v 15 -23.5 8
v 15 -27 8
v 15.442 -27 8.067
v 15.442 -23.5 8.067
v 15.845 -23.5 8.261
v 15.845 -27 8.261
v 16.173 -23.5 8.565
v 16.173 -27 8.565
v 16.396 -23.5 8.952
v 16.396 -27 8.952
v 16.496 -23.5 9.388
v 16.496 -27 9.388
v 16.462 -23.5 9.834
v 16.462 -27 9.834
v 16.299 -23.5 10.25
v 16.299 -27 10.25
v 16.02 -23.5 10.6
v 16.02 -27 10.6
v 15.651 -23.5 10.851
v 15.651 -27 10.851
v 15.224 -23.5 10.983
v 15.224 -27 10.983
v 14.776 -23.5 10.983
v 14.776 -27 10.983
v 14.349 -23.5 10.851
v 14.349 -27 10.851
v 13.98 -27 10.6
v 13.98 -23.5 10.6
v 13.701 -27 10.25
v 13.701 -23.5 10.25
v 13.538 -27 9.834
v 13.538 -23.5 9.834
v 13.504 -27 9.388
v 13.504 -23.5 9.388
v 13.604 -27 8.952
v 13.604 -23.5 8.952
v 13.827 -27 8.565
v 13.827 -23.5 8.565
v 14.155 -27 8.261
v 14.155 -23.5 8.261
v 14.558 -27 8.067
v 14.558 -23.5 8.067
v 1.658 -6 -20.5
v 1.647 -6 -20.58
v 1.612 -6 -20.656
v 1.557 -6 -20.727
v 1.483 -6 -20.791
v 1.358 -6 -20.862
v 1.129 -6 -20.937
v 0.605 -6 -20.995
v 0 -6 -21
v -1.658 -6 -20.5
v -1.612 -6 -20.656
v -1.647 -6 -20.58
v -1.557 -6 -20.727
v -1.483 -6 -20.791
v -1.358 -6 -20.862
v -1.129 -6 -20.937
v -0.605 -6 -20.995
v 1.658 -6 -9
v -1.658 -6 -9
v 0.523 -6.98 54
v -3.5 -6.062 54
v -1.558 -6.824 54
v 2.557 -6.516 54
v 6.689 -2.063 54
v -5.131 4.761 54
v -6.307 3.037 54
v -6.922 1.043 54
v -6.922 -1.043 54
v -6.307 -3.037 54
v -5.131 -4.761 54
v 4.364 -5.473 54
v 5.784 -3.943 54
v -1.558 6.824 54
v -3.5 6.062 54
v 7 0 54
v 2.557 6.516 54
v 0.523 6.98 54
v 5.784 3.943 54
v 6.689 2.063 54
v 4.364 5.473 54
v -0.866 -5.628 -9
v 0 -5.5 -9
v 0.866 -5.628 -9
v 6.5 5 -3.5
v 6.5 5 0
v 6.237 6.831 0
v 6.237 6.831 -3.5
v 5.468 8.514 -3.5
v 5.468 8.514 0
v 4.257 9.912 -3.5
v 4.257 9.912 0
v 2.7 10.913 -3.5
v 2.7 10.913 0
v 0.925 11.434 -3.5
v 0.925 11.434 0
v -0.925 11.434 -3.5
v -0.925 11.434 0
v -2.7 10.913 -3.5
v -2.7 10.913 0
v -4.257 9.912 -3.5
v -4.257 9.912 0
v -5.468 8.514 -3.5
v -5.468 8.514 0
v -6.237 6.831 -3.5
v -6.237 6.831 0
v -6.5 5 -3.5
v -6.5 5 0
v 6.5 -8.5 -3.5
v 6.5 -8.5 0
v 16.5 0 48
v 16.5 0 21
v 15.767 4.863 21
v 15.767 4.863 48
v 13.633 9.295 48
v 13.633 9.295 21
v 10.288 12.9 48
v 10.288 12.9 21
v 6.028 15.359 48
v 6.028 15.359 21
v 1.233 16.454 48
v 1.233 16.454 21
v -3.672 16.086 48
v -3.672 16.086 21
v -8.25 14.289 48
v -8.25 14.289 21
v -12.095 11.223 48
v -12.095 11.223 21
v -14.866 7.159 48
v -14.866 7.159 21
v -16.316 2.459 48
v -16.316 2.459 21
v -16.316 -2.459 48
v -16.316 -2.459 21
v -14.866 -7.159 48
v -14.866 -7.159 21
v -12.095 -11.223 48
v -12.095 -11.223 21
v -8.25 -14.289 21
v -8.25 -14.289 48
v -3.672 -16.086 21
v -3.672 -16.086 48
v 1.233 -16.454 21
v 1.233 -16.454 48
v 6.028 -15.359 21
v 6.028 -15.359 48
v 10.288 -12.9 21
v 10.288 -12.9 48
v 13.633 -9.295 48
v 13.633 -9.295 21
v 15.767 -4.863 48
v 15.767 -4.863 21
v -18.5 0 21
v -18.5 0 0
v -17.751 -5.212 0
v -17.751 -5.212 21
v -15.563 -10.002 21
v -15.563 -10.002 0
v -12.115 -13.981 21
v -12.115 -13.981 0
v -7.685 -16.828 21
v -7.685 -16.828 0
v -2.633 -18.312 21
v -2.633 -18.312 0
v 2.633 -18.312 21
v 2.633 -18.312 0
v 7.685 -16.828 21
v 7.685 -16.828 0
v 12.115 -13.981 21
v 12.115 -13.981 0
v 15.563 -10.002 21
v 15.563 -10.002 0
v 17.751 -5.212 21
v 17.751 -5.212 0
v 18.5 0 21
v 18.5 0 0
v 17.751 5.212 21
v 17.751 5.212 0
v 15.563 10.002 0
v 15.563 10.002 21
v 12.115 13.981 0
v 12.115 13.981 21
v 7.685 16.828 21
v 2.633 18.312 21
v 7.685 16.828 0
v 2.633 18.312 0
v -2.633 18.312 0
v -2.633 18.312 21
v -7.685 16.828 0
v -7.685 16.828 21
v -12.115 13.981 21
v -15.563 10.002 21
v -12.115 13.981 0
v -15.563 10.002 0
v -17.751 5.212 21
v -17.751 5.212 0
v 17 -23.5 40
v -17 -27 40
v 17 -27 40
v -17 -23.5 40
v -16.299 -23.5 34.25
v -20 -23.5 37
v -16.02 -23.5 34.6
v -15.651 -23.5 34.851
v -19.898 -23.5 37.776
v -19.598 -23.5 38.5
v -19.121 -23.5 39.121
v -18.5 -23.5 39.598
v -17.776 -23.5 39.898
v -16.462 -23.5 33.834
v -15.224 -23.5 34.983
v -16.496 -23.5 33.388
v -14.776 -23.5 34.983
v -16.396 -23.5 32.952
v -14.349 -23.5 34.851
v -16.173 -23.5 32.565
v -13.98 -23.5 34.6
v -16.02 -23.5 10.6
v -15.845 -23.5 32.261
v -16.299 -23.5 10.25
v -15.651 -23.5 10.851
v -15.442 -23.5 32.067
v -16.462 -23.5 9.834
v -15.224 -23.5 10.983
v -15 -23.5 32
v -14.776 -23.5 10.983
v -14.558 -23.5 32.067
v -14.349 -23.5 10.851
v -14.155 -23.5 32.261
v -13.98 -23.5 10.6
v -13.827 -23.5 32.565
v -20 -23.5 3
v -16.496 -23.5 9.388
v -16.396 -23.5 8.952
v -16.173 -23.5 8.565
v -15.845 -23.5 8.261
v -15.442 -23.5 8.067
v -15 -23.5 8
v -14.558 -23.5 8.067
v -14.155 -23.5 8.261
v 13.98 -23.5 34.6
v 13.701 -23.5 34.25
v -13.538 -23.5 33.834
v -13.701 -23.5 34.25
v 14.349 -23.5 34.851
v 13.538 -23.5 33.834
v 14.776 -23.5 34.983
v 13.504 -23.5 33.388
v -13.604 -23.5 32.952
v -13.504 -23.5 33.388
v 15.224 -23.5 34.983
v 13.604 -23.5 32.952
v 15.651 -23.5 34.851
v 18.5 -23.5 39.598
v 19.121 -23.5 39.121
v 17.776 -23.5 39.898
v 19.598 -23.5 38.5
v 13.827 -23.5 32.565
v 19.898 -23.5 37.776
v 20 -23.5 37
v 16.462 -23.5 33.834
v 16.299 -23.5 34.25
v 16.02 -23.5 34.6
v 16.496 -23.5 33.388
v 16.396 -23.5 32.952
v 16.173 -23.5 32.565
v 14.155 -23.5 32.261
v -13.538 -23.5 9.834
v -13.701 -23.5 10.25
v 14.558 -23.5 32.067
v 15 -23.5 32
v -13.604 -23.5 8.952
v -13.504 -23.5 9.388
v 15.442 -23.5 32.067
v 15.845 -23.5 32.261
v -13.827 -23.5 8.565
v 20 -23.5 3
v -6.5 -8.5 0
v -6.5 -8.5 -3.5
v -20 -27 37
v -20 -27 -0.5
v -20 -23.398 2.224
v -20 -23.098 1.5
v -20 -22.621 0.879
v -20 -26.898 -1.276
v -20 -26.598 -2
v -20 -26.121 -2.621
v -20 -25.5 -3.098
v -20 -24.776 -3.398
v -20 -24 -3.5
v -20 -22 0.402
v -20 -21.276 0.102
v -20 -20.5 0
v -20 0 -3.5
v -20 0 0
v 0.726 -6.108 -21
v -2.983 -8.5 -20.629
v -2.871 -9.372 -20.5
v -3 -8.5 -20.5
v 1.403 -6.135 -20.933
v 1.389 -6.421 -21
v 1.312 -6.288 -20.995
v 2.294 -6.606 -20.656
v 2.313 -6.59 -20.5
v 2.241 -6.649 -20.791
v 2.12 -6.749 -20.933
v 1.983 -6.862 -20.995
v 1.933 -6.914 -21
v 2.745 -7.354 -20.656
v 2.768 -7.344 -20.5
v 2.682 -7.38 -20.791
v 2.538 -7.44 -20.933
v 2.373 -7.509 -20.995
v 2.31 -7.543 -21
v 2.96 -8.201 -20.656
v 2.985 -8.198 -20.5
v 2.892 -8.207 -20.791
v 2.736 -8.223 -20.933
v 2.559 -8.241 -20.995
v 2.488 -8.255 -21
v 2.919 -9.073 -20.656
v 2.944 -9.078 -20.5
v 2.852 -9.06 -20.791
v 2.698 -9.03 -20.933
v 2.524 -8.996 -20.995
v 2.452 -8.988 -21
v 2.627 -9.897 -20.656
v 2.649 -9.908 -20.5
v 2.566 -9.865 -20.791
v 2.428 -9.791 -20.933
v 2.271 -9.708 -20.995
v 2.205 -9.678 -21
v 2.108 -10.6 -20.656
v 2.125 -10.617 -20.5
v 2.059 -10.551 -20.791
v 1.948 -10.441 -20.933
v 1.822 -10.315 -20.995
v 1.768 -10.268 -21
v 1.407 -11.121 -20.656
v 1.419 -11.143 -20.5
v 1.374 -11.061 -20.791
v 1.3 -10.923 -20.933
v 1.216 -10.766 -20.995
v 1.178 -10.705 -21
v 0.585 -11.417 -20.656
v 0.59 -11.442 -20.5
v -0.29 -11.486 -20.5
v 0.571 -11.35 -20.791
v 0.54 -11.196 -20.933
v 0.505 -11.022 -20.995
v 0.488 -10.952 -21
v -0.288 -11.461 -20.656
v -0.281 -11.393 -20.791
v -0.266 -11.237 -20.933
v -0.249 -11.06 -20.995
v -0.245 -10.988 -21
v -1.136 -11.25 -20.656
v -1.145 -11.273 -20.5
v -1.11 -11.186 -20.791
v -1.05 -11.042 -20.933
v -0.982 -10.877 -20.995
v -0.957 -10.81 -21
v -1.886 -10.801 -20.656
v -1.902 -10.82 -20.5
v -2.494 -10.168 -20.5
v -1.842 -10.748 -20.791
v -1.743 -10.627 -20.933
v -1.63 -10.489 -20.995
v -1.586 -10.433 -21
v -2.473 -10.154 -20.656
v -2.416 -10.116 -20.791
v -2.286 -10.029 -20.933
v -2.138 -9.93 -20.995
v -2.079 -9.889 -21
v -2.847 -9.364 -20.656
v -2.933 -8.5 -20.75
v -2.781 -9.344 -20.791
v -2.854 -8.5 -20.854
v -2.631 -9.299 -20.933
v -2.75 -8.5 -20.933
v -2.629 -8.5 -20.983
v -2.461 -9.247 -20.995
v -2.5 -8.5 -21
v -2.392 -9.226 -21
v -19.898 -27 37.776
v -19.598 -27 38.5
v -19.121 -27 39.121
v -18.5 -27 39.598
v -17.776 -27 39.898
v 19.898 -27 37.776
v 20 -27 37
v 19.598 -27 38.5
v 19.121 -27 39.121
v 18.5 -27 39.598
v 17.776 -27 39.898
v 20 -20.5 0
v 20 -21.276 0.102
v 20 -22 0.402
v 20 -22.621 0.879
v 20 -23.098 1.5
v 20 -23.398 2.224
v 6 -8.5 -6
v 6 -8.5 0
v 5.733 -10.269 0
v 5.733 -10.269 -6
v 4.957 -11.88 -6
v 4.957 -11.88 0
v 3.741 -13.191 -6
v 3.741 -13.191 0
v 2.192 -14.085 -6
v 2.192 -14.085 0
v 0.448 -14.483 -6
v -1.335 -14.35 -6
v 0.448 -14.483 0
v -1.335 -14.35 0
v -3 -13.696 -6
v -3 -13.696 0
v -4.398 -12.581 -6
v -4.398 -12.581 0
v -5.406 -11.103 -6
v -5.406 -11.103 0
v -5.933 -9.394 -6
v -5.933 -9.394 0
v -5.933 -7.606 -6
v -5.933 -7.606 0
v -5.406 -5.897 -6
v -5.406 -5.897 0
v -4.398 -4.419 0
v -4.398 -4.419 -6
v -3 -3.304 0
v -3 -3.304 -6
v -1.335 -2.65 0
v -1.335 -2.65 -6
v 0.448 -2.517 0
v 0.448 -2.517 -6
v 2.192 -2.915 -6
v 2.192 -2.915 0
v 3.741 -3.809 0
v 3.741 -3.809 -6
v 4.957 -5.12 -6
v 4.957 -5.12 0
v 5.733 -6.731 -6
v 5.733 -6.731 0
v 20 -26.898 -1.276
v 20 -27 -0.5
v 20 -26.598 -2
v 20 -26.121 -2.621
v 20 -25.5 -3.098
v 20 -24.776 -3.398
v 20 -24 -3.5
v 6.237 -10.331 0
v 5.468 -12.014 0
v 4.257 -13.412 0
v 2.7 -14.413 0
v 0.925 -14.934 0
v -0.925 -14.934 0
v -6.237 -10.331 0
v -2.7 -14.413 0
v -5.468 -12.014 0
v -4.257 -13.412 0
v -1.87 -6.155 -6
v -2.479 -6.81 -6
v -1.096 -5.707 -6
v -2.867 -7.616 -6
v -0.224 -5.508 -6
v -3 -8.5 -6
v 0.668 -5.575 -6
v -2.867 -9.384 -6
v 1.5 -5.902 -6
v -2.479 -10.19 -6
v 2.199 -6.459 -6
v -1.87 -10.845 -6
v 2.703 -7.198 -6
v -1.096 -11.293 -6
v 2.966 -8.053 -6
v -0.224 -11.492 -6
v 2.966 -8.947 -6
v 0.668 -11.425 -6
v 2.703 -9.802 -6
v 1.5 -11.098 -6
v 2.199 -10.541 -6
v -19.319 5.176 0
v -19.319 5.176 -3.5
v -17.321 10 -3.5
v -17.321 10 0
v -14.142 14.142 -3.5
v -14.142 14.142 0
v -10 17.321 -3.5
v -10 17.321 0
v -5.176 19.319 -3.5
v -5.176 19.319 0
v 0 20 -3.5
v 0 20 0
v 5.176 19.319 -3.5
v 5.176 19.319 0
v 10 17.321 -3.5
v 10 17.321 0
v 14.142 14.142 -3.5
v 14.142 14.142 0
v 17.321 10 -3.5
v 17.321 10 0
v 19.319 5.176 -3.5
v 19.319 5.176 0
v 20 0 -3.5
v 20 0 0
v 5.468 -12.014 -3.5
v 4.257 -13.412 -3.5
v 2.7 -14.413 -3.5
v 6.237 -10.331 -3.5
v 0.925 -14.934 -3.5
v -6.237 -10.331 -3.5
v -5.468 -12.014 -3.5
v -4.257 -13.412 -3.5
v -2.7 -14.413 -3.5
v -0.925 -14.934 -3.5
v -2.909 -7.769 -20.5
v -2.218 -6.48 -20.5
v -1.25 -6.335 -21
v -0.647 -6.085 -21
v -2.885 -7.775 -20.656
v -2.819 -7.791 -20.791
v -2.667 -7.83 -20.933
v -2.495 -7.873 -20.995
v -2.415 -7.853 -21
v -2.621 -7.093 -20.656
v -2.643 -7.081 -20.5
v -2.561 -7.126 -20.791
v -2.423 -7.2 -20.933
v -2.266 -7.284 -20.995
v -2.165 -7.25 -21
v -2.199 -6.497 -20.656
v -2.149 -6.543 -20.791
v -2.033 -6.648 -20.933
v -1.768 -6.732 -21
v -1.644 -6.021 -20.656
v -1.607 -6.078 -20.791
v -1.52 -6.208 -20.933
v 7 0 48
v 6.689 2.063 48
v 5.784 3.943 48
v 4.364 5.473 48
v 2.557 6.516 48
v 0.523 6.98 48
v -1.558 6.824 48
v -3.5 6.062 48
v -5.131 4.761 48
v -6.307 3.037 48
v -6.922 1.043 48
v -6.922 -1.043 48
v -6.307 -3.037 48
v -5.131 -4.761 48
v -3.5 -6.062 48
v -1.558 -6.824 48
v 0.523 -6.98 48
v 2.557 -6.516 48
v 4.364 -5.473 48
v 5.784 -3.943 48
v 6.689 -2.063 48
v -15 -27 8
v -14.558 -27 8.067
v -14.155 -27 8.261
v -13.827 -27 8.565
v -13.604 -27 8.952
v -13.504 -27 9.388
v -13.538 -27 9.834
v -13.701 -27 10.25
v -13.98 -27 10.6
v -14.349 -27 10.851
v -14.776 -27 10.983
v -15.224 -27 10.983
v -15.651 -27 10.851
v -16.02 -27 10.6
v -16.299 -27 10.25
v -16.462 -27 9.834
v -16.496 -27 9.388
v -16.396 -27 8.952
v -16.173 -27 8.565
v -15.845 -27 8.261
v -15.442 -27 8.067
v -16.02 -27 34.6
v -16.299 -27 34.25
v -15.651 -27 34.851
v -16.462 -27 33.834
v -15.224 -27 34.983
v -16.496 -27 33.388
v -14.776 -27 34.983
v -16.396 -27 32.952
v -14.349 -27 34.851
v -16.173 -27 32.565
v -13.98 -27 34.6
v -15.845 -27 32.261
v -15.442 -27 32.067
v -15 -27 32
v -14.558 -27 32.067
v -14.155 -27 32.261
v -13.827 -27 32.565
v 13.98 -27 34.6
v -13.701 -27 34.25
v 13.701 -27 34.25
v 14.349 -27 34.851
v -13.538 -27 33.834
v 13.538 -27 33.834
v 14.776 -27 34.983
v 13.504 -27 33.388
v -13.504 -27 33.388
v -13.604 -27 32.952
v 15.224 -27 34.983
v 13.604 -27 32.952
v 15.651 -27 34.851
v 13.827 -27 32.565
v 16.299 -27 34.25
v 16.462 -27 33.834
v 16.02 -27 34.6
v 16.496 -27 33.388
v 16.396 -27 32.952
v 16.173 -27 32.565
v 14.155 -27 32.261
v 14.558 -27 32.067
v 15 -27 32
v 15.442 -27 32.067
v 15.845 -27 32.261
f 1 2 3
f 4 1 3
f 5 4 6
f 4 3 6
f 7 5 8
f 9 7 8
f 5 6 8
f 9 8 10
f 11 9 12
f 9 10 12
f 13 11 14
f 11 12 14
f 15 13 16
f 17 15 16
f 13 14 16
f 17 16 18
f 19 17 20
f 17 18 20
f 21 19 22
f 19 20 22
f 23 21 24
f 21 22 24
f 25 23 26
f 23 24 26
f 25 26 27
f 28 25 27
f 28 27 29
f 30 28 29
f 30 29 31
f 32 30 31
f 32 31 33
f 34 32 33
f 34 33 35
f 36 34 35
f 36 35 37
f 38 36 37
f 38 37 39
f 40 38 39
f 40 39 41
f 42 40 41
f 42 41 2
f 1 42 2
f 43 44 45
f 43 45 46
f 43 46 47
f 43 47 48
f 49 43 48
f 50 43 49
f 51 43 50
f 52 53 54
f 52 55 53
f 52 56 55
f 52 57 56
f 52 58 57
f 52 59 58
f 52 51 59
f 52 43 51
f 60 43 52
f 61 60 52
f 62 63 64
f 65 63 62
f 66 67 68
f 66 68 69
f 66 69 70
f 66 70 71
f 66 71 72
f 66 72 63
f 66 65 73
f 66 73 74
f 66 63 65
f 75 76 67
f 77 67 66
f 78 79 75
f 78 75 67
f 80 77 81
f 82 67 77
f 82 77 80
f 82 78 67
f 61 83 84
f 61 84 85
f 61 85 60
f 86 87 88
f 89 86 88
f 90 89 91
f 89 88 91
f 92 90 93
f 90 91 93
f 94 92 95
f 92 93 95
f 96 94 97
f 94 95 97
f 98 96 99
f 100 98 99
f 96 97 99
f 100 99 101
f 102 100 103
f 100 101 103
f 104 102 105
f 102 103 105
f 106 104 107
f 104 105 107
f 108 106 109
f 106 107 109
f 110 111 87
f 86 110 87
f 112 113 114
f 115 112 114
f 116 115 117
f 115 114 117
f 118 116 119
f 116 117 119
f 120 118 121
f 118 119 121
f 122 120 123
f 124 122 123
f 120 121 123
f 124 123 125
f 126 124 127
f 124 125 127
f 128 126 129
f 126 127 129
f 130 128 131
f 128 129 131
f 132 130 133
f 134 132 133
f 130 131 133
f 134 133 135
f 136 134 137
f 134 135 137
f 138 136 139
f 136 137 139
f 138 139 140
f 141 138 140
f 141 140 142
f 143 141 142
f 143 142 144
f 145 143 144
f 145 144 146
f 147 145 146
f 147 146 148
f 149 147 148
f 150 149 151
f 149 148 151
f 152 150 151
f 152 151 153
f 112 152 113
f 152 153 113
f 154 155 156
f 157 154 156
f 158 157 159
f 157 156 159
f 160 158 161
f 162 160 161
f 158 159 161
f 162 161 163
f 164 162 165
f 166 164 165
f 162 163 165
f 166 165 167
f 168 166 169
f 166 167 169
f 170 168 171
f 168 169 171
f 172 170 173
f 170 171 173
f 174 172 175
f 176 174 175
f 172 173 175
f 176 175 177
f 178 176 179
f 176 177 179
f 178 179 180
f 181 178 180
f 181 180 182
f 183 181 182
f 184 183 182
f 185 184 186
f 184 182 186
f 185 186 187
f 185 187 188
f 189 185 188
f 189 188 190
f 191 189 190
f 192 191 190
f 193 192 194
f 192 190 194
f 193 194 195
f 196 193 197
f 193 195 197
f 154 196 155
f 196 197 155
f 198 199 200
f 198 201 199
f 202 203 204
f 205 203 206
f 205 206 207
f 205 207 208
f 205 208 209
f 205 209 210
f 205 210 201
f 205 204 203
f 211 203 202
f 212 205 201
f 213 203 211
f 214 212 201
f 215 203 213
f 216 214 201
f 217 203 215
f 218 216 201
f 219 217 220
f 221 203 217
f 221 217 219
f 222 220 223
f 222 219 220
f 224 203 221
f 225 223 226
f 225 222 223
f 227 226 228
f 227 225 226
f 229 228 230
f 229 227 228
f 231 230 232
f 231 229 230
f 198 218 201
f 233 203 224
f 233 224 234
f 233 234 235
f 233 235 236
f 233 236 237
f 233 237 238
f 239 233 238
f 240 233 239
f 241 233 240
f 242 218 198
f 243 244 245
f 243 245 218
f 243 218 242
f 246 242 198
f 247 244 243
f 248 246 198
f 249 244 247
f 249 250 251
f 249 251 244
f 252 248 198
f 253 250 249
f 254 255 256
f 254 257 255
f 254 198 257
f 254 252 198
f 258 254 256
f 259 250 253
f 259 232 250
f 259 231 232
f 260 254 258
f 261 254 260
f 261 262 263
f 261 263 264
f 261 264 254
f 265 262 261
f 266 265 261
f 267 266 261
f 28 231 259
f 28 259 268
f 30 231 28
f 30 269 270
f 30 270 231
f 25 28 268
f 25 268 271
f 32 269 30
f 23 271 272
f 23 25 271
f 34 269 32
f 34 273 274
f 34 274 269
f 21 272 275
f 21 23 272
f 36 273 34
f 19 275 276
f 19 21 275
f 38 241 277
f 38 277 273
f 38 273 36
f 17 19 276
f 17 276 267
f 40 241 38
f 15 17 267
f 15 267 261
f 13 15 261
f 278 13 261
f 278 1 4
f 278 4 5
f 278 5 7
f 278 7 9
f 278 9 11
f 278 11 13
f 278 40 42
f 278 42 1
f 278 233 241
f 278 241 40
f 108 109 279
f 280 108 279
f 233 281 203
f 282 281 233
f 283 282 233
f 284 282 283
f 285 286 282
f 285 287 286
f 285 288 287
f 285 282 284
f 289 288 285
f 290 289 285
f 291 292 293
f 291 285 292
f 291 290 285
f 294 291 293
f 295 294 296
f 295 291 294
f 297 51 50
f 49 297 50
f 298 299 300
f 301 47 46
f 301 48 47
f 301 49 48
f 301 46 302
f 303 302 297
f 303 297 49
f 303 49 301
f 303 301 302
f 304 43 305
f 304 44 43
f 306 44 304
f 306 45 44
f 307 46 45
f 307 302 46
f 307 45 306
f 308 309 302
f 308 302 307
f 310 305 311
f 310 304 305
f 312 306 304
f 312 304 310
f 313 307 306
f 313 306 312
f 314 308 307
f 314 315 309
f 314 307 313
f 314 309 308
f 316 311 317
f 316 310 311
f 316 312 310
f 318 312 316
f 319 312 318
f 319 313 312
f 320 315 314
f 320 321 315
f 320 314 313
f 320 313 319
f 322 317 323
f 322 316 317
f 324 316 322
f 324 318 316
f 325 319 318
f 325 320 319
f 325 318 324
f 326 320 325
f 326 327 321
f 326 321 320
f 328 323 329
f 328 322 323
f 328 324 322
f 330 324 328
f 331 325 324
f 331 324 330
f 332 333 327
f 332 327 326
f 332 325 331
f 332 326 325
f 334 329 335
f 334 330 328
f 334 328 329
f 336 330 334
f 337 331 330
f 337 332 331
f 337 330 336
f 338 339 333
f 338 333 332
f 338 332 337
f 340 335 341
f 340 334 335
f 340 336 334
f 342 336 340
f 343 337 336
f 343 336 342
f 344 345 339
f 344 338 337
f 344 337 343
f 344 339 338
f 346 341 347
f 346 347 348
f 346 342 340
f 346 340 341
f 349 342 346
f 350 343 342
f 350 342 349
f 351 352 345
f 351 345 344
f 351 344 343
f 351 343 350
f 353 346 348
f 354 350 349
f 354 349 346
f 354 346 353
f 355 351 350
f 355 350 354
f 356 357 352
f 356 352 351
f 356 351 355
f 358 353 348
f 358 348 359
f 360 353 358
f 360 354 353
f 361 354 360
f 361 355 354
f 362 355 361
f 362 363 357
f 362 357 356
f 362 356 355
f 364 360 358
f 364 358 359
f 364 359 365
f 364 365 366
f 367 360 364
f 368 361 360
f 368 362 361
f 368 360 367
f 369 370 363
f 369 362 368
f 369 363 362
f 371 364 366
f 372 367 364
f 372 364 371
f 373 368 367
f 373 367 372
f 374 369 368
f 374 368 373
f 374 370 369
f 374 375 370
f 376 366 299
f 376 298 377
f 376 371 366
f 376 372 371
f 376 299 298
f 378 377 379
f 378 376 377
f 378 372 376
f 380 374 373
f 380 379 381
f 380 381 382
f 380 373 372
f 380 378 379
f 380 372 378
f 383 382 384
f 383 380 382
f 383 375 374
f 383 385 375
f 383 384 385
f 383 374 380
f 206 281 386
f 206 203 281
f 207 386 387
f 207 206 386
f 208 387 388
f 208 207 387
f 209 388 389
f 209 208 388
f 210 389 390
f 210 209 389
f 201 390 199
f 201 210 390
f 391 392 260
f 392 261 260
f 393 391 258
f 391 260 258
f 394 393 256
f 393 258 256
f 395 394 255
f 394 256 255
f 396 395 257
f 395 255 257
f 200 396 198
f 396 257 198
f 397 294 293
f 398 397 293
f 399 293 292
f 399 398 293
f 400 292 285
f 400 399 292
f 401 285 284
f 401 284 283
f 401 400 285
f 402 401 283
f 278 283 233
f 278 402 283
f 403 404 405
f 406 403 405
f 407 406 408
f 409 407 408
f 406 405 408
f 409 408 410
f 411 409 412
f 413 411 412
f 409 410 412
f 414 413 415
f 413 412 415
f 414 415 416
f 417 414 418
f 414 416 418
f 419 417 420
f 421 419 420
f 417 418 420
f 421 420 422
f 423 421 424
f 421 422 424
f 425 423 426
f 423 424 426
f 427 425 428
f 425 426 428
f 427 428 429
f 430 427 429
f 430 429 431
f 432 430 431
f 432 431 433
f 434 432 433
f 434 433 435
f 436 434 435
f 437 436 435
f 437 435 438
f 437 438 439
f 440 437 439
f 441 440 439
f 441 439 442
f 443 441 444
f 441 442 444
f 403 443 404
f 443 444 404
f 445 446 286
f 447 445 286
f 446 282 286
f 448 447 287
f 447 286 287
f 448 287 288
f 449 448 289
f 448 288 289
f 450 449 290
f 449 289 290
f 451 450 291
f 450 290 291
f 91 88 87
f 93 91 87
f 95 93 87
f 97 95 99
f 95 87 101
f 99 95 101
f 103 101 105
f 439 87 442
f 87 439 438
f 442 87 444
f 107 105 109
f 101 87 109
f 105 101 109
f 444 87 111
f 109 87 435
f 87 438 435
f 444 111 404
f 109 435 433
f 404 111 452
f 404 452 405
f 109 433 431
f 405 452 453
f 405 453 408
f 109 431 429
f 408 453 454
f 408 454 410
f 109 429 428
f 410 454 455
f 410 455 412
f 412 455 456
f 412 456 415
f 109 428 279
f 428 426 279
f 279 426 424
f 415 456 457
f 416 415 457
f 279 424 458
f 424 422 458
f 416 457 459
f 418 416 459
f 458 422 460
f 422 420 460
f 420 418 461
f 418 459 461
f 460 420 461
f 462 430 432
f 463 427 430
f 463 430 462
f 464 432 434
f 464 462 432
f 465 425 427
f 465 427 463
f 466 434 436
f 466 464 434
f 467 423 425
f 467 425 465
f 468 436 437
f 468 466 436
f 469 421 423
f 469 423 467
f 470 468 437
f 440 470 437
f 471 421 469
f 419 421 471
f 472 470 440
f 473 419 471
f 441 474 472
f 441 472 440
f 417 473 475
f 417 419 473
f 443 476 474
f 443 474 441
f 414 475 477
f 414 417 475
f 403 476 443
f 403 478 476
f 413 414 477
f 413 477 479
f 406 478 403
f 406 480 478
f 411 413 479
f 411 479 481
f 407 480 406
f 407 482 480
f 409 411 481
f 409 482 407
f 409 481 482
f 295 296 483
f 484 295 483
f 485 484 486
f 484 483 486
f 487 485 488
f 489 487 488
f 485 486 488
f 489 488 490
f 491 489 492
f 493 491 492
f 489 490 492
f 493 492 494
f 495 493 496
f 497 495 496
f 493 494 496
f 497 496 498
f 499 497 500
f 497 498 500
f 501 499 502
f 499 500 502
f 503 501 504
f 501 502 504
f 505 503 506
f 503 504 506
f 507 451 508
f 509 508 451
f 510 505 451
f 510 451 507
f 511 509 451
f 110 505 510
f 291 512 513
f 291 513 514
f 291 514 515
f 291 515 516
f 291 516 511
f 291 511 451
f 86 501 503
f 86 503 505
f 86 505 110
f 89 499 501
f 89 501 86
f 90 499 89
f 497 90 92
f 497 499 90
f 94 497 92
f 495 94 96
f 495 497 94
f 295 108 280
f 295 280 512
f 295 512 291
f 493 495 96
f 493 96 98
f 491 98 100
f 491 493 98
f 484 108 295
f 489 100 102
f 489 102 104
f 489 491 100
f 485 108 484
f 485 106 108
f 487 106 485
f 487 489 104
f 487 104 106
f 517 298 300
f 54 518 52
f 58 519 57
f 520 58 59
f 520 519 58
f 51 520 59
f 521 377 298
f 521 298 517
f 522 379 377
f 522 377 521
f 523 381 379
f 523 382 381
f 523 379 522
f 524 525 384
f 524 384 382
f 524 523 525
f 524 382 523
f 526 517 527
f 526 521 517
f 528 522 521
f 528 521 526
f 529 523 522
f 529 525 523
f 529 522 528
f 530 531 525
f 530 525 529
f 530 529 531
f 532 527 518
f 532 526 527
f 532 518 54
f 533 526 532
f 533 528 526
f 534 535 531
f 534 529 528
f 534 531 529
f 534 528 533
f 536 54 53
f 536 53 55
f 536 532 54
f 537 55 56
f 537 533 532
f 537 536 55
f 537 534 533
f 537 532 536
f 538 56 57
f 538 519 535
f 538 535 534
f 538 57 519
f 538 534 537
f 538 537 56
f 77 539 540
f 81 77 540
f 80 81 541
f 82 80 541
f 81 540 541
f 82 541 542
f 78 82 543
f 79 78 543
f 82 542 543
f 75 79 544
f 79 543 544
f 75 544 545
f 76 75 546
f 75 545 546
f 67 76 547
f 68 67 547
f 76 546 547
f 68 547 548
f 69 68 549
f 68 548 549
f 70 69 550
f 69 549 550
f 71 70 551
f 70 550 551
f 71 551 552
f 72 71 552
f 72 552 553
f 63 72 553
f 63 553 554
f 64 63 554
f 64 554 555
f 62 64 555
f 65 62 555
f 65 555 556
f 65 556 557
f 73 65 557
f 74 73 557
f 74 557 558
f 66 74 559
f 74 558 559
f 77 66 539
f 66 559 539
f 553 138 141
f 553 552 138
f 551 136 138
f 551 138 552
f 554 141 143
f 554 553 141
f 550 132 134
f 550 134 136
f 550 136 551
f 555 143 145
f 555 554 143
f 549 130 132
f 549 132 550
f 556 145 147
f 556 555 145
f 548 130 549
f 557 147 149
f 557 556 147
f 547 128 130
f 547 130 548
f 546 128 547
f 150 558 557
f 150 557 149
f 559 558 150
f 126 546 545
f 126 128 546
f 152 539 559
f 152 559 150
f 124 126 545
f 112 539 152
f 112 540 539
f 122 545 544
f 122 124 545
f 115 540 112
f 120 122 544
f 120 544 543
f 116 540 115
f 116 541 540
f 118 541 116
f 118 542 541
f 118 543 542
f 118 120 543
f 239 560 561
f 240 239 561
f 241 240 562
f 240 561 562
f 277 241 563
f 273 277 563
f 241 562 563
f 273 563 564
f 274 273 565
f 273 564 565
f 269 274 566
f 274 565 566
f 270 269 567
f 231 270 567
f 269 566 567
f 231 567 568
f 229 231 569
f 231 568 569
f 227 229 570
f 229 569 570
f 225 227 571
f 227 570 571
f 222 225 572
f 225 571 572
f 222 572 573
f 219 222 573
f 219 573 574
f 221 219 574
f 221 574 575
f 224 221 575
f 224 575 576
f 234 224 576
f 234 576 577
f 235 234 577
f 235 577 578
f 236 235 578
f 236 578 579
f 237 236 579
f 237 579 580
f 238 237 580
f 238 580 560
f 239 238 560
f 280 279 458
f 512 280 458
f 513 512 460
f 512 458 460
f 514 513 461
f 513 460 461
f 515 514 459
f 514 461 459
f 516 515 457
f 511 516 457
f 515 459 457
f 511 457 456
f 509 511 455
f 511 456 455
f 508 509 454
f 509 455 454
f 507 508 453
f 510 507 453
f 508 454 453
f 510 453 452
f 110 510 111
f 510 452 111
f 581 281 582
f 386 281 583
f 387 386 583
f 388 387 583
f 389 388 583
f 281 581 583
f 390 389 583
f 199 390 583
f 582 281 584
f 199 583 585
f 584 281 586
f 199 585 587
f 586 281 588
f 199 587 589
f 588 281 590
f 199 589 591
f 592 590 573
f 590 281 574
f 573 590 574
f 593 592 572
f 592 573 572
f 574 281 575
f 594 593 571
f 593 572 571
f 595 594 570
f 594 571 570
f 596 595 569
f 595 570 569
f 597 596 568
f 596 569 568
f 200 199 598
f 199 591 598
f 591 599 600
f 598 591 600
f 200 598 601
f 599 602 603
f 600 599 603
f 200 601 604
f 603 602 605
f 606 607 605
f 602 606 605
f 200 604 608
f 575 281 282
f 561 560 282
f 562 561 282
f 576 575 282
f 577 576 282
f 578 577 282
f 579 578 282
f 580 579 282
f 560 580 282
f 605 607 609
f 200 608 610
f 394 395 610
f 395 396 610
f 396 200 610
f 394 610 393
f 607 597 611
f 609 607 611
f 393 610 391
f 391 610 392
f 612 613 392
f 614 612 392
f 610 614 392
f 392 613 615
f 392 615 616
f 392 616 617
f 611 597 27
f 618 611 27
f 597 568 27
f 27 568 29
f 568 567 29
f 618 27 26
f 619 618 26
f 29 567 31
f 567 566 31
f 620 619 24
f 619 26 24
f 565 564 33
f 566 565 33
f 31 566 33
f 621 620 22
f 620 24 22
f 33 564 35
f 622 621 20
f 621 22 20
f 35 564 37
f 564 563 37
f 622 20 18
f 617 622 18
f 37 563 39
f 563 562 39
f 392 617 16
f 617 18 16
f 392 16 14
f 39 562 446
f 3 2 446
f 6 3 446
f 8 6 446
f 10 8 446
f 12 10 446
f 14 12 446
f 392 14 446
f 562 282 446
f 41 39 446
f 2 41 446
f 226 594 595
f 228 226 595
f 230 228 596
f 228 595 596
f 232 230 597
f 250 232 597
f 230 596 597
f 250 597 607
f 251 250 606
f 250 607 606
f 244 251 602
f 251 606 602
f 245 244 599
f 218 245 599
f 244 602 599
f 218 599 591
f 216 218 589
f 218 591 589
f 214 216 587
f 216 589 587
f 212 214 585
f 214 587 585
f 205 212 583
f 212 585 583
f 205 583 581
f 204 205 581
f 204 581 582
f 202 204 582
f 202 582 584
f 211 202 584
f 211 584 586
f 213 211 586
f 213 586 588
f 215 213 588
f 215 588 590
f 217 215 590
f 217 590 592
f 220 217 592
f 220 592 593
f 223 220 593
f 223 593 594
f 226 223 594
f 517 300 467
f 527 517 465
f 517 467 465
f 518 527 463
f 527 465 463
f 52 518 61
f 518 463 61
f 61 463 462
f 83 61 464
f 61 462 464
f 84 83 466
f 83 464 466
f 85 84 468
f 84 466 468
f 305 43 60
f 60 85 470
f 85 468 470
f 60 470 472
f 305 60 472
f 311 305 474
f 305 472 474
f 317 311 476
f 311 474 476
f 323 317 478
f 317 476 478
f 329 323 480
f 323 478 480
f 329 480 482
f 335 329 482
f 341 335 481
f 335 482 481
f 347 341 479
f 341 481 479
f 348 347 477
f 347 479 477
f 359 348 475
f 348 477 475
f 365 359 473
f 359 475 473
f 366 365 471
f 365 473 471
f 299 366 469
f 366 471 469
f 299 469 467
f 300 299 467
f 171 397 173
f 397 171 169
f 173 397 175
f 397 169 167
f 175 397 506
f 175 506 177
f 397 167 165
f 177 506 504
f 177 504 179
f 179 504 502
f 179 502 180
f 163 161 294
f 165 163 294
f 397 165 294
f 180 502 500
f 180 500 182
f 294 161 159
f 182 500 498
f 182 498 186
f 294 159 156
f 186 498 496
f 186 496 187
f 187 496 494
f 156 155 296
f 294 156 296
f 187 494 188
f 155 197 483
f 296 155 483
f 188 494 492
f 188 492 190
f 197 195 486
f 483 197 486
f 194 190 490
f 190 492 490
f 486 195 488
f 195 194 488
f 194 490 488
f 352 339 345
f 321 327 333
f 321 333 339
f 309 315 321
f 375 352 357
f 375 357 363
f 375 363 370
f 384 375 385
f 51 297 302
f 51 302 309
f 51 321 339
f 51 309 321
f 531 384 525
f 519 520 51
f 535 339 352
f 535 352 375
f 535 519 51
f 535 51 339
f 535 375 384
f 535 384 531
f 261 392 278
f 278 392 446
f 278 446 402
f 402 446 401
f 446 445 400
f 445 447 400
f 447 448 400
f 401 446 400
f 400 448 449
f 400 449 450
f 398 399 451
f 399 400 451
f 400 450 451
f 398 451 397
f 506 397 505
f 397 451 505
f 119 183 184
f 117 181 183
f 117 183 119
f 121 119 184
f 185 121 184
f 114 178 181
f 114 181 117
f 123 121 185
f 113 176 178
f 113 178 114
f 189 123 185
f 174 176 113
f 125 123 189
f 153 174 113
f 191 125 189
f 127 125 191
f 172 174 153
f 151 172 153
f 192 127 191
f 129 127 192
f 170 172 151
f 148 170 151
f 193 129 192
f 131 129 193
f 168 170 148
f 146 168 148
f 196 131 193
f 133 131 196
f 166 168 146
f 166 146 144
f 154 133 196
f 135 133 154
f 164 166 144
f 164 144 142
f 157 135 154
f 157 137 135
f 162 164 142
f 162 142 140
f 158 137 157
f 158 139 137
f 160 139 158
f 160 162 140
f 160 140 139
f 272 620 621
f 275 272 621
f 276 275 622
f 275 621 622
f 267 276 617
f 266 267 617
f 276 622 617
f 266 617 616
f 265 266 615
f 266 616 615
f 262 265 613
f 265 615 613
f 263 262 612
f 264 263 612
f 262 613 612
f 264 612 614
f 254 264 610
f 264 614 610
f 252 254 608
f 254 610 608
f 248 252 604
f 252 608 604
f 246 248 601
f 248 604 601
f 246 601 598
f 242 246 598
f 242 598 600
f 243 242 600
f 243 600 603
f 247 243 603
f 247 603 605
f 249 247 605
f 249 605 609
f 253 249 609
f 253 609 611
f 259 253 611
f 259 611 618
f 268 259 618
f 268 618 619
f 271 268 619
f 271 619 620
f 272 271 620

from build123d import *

# Parameters (mm, degrees)
SKETCH1_R           = 18.5
BOSS_EXTRUDE1_DEPTH = 21
SKETCH2_R           = 16.5
BOSS_EXTRUDE2_DEPTH = 27
SKETCH3_R           = 7
BOSS_EXTRUDE3_DEPTH = 6
BOSS_EXTRUDE4_DEPTH = 3.5
SKETCH5_W           = 40
SKETCH5_H           = 3.5
BOSS_EXTRUDE5_DEPTH = 40
FILLET1_R           = 3
SKETCH6_R           = 6
BOSS_EXTRUDE6_DEPTH = 6
SKETCH7_R           = 3
BOSS_EXTRUDE7_DEPTH = 15
FILLET2_R           = 0.5
CUT_EXTRUDE1_START  = -12
CUT_EXTRUDE1_DEPTH  = 12
CUT_EXTRUDE2_REACH  = 76.33
SKETCH9_R           = 1.5


with BuildPart() as part:
    # Sketch1 → Boss-Extrude1 (new body)
    with BuildSketch(Plane.XY):
        with Locations(Location((0, 0, 0), (0, 0, 180))):
            Circle(SKETCH1_R)
    extrude(amount=BOSS_EXTRUDE1_DEPTH)

    # Sketch2 → Boss-Extrude2 (add)
    with BuildSketch(Plane.XY.offset(21)):
        Circle(SKETCH2_R)
    extrude(amount=BOSS_EXTRUDE2_DEPTH)

    # Sketch3 → Boss-Extrude3 (add)
    with BuildSketch(Plane.XY.offset(48)):
        Circle(SKETCH3_R)
    extrude(amount=BOSS_EXTRUDE3_DEPTH)

    # Sketch4 → Boss-Extrude4 (add)
    with BuildSketch(Plane(origin=(0, 0, 0), x_dir=(-1, 0, 0), z_dir=(0, 0, -1))):
        with BuildLine():
            Line((-20, 0), (-20, -27))
            Line((-20, -27), (20, -27))
            Line((20, -27), (20, 0))
            ThreePointArc((20, 0), (0, 20), (-20, 0))
        make_face()
        with BuildLine():
            Line((6.5, 5), (6.5, -8.5))
            ThreePointArc((6.5, -8.5), (0, -15), (-6.5, -8.5))
            Line((-6.5, -8.5), (-6.5, 5))
            ThreePointArc((-6.5, 5), (0, 11.5), (6.5, 5))
        make_face(mode=Mode.SUBTRACT)
    extrude(amount=BOSS_EXTRUDE4_DEPTH)

    # Sketch5 → Boss-Extrude5 (add)
    with BuildSketch(Plane.XY):
        with Locations((0, -25.25)):
            Rectangle(SKETCH5_W, SKETCH5_H)
    extrude(amount=BOSS_EXTRUDE5_DEPTH)

    # Fillet1
    fillet1_edges = [part.edges().sort_by_distance(p)[0] for p in [
        (0, -27, -3.5),
        (0, -23.5, 0),
        (20, -25.25, 40),
        (-20, -25.25, 40),
    ]]
    fillet(fillet1_edges, radius=FILLET1_R)

    # Sketch6 → Boss-Extrude6 (add)
    with BuildSketch(Plane(origin=(0, 0, 0), x_dir=(-1, 0, 0), z_dir=(0, 0, -1))):
        with Locations(Location((0, -8.5, 0), (0, 0, 180))):
            Circle(SKETCH6_R)
    extrude(amount=BOSS_EXTRUDE6_DEPTH)

    # Sketch7 → Boss-Extrude7 (add)
    with BuildSketch(Plane(origin=(0, 0, -6), x_dir=(-1, 0, 0), z_dir=(0, 0, -1))):
        with Locations((0, -8.5)):
            Circle(SKETCH7_R)
    extrude(amount=BOSS_EXTRUDE7_DEPTH)

    # Fillet2
    fillet2_edges = [part.edges().sort_by_distance(p)[0] for p in [
        (3, -8.5, -21),
    ]]
    fillet(fillet2_edges, radius=FILLET2_R)

    # Sketch8 → Cut-Extrude1 (cut)
    with BuildSketch(Plane(origin=(0, 0, -21), x_dir=(-1, 0, 0), z_dir=(0, 0, -1)).offset(CUT_EXTRUDE1_START)):
        with BuildLine():
            Line((-1.658312395, -6), (1.658312395, -6))
            ThreePointArc((1.658312395, -6), (0, -5.5), (-1.658312395, -6))
        make_face()
    extrude(amount=CUT_EXTRUDE1_DEPTH, mode=Mode.SUBTRACT)

    # Sketch9 → Cut-Extrude2 (cut, up to next)
    with BuildSketch(Plane.XZ.offset(27), mode=Mode.PRIVATE) as cut_extrude2_sk1:
        with Locations(Location((15, 33.5, 0), (0, 0, 270))):
            Circle(SKETCH9_R)
    cut_extrude2_tool1 = extrude(cut_extrude2_sk1.sketch, amount=-CUT_EXTRUDE2_REACH, mode=Mode.PRIVATE) & part.part
    # Sketch9 → Cut-Extrude2 (cut, up to next)
    with BuildSketch(Plane.XZ.offset(27), mode=Mode.PRIVATE) as cut_extrude2_sk2:
        with Locations(Location((15, 9.5, 0), (0, 0, 270))):
            Circle(SKETCH9_R)
    cut_extrude2_tool2 = extrude(cut_extrude2_sk2.sketch, amount=-CUT_EXTRUDE2_REACH, mode=Mode.PRIVATE) & part.part
    # Sketch9 → Cut-Extrude2 (cut, up to next)
    with BuildSketch(Plane.XZ.offset(27), mode=Mode.PRIVATE) as cut_extrude2_sk3:
        with Locations(Location((-15, 33.5, 0), (0, 0, 270))):
            Circle(SKETCH9_R)
    cut_extrude2_tool3 = extrude(cut_extrude2_sk3.sketch, amount=-CUT_EXTRUDE2_REACH, mode=Mode.PRIVATE) & part.part
    # Sketch9 → Cut-Extrude2 (cut, up to next)
    with BuildSketch(Plane.XZ.offset(27), mode=Mode.PRIVATE) as cut_extrude2_sk4:
        with Locations(Location((-15, 9.5, 0), (0, 0, 270))):
            Circle(SKETCH9_R)
    cut_extrude2_tool4 = extrude(cut_extrude2_sk4.sketch, amount=-CUT_EXTRUDE2_REACH, mode=Mode.PRIVATE) & part.part
    add(cut_extrude2_tool1.solids().sort_by_distance((15, -27, 33.5))[0], mode=Mode.SUBTRACT)
    add(cut_extrude2_tool2.solids().sort_by_distance((15, -27, 9.5))[0], mode=Mode.SUBTRACT)
    add(cut_extrude2_tool3.solids().sort_by_distance((-15, -27, 33.5))[0], mode=Mode.SUBTRACT)
    add(cut_extrude2_tool4.solids().sort_by_distance((-15, -27, 9.5))[0], mode=Mode.SUBTRACT)


solid = part.part
